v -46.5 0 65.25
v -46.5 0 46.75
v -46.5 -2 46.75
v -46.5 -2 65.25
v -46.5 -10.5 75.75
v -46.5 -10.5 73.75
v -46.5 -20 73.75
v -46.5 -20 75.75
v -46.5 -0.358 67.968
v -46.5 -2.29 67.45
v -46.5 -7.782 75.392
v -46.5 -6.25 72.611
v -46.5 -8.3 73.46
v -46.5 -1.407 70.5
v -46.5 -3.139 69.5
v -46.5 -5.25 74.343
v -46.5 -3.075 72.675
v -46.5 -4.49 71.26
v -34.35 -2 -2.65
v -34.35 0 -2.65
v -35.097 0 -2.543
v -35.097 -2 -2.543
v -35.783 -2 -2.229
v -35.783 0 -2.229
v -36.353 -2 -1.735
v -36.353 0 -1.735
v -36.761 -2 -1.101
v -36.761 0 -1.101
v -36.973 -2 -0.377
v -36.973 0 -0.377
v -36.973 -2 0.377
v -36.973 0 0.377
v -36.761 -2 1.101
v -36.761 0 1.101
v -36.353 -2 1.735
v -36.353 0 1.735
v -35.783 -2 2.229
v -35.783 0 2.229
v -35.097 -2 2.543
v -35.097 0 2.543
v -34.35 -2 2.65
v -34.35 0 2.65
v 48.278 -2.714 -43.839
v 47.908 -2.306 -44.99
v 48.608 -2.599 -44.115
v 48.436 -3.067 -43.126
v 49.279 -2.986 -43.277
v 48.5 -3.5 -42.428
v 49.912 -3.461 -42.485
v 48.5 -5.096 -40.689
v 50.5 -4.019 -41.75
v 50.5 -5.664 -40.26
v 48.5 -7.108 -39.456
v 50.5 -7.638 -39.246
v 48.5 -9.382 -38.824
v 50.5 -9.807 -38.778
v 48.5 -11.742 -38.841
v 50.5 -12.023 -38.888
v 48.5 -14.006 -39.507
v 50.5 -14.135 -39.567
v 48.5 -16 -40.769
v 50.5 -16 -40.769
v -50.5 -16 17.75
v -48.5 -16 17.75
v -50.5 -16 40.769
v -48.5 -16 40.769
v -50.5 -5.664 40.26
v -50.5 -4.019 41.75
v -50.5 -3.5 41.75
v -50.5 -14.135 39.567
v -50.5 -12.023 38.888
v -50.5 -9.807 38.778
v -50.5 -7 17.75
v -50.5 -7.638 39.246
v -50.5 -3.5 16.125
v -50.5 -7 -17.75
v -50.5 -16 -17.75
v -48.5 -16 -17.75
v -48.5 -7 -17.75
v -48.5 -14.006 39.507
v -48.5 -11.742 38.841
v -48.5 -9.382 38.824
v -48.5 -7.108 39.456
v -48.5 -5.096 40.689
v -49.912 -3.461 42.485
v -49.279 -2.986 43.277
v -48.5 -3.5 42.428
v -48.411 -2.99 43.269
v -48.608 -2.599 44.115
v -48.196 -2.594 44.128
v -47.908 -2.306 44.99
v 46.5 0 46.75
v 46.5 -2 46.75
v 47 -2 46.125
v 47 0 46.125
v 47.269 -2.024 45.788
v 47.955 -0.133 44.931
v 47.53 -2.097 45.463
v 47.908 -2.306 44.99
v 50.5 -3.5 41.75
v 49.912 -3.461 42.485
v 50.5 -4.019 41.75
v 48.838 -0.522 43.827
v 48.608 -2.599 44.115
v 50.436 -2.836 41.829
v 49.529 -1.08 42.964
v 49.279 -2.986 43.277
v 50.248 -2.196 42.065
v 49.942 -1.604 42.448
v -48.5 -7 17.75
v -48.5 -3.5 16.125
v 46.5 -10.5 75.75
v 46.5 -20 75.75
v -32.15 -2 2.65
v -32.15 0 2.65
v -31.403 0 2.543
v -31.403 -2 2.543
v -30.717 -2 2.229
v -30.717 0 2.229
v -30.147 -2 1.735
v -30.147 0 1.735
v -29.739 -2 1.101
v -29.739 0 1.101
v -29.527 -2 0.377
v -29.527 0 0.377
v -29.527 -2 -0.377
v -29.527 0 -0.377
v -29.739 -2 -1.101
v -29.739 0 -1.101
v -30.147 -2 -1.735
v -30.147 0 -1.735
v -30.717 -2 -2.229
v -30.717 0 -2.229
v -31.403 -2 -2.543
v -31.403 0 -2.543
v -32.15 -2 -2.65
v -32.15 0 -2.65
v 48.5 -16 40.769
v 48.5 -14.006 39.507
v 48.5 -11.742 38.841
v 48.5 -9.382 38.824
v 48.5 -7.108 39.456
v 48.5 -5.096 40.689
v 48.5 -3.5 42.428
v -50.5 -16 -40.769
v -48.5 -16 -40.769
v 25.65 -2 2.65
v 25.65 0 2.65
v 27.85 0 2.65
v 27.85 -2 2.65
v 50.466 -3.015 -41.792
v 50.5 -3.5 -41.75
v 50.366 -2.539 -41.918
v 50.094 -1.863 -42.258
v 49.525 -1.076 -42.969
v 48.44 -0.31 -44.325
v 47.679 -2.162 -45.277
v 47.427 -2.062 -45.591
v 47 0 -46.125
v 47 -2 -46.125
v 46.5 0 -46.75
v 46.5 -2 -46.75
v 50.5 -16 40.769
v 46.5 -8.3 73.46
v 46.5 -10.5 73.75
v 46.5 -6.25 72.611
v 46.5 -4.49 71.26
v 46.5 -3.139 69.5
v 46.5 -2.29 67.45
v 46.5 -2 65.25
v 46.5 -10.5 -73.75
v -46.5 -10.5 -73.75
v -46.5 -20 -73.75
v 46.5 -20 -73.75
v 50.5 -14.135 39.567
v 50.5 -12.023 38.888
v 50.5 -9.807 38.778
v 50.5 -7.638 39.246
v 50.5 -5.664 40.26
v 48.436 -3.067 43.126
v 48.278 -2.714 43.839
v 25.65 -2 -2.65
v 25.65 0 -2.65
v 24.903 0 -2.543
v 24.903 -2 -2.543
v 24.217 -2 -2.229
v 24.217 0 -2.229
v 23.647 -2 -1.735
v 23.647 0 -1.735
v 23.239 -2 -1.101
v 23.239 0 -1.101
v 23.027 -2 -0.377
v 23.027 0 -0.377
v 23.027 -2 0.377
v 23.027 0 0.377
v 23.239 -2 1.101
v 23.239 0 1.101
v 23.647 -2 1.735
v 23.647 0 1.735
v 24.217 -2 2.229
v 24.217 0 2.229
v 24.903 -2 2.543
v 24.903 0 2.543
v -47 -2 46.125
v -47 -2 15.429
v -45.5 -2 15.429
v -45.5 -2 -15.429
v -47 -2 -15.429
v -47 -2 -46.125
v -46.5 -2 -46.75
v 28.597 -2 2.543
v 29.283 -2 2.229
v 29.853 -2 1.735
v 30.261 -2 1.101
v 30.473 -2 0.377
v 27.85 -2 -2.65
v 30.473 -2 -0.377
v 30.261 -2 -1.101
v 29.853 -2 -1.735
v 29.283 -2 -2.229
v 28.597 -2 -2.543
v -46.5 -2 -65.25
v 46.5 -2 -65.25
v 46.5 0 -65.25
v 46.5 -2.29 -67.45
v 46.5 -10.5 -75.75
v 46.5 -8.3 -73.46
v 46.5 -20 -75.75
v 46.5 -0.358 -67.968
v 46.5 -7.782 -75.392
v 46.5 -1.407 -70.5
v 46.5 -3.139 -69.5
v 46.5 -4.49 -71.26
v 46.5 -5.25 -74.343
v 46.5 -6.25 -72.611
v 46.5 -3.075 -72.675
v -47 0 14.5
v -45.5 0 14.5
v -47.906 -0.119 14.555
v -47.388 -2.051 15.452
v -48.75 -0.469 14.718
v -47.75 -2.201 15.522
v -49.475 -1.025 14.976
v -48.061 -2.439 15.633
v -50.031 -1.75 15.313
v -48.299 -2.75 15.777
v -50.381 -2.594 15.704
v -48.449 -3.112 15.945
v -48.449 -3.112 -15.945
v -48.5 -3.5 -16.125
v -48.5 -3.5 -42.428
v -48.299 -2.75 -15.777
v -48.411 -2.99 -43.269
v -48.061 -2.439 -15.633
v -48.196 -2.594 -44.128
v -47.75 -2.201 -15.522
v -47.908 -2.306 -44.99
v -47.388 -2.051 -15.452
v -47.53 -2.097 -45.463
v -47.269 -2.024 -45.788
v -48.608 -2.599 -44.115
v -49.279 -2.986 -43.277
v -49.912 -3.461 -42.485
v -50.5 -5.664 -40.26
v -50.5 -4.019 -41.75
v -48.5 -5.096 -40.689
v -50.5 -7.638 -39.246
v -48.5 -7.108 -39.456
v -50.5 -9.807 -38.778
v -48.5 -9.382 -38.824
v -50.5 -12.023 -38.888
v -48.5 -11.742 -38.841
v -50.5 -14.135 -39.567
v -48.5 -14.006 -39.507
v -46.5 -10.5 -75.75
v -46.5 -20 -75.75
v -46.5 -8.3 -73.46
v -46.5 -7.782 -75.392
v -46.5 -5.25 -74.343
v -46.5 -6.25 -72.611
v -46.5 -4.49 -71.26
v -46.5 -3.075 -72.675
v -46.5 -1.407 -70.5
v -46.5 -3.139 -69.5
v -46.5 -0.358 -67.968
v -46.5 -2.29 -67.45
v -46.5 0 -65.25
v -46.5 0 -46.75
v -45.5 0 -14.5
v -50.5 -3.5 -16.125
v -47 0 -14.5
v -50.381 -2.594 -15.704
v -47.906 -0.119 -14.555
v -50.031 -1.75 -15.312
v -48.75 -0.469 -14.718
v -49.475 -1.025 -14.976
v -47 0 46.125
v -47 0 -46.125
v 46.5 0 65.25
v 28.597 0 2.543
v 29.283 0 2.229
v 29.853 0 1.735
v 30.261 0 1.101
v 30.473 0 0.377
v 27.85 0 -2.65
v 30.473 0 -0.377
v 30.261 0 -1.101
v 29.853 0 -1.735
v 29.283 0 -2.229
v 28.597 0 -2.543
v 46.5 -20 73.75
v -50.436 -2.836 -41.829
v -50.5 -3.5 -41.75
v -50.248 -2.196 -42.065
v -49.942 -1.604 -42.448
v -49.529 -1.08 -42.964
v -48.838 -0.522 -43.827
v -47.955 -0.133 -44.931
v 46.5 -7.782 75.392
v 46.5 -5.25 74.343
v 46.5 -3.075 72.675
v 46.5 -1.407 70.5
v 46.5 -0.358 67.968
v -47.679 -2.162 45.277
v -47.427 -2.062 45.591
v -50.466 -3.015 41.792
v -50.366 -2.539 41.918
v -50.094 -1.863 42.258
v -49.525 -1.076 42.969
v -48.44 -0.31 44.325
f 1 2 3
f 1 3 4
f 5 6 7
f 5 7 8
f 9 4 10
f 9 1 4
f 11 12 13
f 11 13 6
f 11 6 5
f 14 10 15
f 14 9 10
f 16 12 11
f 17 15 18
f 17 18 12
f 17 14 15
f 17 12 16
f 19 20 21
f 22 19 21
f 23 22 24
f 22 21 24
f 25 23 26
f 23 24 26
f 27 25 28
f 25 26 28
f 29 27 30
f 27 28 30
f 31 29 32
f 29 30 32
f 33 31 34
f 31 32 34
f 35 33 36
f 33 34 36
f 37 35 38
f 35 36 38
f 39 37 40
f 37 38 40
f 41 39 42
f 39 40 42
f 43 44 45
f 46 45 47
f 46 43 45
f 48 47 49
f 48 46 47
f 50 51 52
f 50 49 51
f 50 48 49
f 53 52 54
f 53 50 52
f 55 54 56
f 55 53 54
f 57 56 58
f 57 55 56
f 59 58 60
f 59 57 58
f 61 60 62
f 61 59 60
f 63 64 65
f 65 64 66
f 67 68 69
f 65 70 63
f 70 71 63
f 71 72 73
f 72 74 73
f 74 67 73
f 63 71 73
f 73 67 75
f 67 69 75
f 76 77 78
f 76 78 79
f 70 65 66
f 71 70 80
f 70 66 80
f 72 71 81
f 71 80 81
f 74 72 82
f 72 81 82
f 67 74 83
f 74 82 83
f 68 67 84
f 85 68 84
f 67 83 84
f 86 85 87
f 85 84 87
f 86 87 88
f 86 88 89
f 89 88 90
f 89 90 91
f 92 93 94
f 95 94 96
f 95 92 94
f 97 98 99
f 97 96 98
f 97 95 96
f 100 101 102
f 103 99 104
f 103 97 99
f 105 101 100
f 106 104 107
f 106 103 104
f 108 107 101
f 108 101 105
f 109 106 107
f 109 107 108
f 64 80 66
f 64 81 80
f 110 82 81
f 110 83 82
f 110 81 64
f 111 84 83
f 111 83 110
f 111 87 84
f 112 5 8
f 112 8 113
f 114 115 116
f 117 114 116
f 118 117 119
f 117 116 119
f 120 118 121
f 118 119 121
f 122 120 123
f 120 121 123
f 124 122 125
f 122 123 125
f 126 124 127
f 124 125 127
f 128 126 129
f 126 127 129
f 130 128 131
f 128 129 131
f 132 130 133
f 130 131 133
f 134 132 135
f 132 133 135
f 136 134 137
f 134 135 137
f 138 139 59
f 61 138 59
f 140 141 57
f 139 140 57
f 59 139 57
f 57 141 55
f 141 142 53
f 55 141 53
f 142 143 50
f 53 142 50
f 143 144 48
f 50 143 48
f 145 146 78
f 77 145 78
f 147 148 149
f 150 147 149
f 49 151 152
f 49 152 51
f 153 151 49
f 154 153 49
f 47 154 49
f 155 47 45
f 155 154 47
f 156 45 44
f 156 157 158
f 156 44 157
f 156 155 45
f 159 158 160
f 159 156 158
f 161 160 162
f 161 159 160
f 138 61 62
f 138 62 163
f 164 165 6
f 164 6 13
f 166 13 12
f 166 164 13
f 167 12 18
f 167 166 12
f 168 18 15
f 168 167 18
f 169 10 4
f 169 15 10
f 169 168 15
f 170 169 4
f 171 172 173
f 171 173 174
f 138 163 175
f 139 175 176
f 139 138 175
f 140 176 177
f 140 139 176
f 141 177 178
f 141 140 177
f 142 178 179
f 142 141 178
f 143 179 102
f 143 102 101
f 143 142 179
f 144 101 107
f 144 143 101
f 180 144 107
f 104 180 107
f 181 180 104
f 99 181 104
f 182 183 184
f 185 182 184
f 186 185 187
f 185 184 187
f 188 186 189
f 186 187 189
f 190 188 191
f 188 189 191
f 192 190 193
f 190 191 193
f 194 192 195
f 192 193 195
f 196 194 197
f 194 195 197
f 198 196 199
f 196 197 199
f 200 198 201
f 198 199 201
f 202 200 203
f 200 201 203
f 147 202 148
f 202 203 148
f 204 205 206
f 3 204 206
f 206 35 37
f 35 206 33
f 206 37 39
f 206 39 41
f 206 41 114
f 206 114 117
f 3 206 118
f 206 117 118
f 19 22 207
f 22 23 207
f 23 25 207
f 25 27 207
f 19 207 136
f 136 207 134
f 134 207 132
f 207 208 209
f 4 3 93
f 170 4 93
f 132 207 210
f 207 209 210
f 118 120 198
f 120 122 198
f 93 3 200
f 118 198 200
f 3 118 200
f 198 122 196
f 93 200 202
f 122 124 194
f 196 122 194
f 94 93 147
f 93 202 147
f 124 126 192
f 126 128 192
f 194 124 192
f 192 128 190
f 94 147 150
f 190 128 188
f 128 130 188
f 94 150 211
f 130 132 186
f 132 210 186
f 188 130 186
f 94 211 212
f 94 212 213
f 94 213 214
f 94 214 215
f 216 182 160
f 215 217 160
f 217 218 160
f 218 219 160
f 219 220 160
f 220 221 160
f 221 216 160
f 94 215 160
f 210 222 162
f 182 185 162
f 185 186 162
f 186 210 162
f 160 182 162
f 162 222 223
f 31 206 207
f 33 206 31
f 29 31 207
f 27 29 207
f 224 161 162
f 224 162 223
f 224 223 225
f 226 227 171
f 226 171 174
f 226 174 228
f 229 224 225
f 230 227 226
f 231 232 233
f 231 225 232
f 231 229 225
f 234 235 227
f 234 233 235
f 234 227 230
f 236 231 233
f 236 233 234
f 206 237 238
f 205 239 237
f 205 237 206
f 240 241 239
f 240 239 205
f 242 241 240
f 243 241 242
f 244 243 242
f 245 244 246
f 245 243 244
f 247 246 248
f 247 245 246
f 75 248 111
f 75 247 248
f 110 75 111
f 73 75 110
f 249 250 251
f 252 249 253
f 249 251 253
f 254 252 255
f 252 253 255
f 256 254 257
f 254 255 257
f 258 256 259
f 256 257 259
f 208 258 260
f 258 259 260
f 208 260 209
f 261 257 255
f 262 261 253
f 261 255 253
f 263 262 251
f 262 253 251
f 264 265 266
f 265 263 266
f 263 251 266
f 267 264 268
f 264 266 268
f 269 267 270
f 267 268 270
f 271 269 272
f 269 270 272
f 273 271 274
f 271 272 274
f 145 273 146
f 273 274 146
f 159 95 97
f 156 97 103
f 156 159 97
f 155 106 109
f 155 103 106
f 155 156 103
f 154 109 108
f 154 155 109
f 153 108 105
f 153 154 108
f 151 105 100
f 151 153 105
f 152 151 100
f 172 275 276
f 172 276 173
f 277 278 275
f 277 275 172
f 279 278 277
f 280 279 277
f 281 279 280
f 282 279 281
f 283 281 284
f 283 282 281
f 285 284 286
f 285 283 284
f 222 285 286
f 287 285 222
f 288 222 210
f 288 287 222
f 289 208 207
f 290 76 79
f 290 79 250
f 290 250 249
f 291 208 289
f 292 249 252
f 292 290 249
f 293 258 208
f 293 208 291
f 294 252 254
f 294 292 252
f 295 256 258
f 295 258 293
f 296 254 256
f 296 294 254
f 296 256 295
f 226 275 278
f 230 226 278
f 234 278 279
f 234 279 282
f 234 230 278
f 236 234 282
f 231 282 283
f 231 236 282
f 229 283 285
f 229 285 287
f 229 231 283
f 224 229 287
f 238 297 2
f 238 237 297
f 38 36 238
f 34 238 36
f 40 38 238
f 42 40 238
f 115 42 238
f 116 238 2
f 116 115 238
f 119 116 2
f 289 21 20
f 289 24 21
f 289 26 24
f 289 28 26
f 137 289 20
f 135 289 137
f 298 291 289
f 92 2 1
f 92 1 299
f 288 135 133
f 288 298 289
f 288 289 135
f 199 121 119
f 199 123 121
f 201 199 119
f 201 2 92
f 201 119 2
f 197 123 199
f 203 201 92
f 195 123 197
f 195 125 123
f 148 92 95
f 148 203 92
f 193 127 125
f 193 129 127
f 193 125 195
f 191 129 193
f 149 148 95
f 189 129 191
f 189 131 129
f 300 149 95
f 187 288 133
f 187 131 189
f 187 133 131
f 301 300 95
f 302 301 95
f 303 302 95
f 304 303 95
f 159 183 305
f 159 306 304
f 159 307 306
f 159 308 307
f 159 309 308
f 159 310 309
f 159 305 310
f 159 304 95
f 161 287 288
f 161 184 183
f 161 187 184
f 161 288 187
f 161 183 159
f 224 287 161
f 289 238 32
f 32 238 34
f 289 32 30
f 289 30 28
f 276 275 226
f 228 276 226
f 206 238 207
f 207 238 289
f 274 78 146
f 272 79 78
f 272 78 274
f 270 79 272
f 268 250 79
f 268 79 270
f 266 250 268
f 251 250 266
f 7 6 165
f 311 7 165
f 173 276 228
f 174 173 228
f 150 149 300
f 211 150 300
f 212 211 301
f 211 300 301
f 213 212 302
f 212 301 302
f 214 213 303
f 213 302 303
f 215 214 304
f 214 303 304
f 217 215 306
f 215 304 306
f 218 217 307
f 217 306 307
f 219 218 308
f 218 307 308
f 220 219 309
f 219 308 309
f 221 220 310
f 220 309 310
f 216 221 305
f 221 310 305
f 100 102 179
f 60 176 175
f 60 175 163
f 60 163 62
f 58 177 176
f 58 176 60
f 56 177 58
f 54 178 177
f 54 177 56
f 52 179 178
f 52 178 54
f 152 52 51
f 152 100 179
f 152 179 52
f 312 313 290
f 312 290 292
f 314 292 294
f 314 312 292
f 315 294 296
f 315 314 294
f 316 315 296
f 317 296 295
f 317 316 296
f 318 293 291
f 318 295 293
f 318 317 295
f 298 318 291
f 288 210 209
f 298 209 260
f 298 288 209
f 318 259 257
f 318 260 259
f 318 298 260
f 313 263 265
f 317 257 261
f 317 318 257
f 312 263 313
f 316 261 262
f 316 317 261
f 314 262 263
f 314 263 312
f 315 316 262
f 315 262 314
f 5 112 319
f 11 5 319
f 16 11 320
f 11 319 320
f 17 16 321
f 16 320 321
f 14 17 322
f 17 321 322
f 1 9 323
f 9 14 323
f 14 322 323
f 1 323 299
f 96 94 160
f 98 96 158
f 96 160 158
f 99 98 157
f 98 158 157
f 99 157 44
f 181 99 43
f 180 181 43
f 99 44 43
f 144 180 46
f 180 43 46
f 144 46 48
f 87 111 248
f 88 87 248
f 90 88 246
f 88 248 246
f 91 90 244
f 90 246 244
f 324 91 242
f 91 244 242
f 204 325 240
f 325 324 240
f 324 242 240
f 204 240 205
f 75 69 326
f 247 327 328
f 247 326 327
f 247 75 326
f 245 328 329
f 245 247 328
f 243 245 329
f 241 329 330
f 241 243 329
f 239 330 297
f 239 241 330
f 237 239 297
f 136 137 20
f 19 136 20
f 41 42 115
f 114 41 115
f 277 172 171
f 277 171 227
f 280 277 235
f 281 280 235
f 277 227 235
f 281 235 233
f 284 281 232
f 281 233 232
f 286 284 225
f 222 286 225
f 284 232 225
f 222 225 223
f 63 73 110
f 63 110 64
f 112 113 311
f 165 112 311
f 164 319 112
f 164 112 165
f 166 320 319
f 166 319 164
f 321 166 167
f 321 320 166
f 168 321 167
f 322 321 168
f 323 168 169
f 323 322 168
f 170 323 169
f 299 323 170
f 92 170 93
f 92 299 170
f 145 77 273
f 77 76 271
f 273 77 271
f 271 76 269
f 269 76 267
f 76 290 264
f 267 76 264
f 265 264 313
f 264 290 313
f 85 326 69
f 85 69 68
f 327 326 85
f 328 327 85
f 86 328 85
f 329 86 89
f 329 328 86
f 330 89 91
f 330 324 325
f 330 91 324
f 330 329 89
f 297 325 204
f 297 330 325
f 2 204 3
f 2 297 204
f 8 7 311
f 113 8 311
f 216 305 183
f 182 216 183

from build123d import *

# Parameters (mm, degrees)
ESQUISSE1_W                  = 101
ESQUISSE1_H                  = 151.5
EXTRUSION1_DEPTH             = 20
CONG_2_R                     = 10.5
CONG_3_R                     = 3.5
COQUE1_T                     = -2
ENL_V_MAT_EXTRU_4_DEPTH      = 21
ENL_V_MAT_EXTRU_1_DEPTH      = 51.5
ENL_V_MAT_EXTRU_1_DEPTH_BACK = 51.5
ENL_V_MAT_EXTRU_2_DEPTH      = 5
ENL_V_MAT_EXTRU_5_DEPTH      = 21


with BuildPart() as part:
    # Esquisse1 → Extrusion1 (new body)
    with BuildSketch(Plane(origin=(0, 0, 0), x_dir=(1, 0, 0), z_dir=(0, 1, 0))):
        Rectangle(ESQUISSE1_W, ESQUISSE1_H)
    extrude(amount=-EXTRUSION1_DEPTH)

    # Congé2
    cong_2_edges = [part.edges().sort_by_distance(p)[0] for p in [
        (0, 0, -75.75),
        (0, 0, 75.75),
    ]]
    fillet(cong_2_edges, radius=CONG_2_R)

    # Congé3
    cong_3_edges = [part.edges().sort_by_distance(p)[0] for p in [
        (-50.5, 0, 0),
        (50.5, 0, 0),
        (-50.5, -3.075378798, 72.674621202),
        (-50.5, -3.075378798, -72.674621202),
        (50.5, -3.075378798, 72.674621202),
        (50.5, -3.075378798, -72.674621202),
        (-50.5, -15.25, -75.75),
        (50.5, -15.25, -75.75),
        (50.5, -15.25, 75.75),
        (-50.5, -15.25, 75.75),
    ]]
    fillet(cong_3_edges, radius=CONG_3_R)

    # Coque1
    coque1_openings = [part.faces().sort_by_distance(p)[0] for p in [
        (0, -20, 0),
    ]]
    offset(amount=COQUE1_T, openings=coque1_openings, kind=Kind.INTERSECTION)

    # Esquisse5 → Enlèv. mat.-Extru.4 (cut, through all)
    with BuildSketch(Plane(origin=(0, 0, 0), x_dir=(-1, 0, 0), z_dir=(0, 1, 0))):
        Polygon((-46.5, -75.75), (-50.5, -75.75), (-50.5, -41.75), (-46.5, -46.75), align=None)
        Polygon((-46.5, 46.75), (-50.5, 41.75), (-50.5, 75.75), (-46.5, 75.75), align=None)
        Polygon((46.5, 75.75), (50.5, 75.75), (50.5, 41.75), (46.5, 46.75), align=None)
        Polygon((46.5, -46.75), (50.5, -41.75), (50.5, -75.75), (46.5, -75.75), align=None)
    extrude(amount=-ENL_V_MAT_EXTRU_4_DEPTH, mode=Mode.SUBTRACT)

    # Esquisse2 → Enlèv. mat.-Extru.1 (cut, two sides)
    with BuildSketch(Plane(origin=(0, 0, 0), x_dir=(0, 0, -1), z_dir=(1, 0, 0))) as enl_v_mat_extru_1_sk:
        with BuildLine():
            Line((-73.75, -10.5), (-73.75, -20))
            Line((-73.75, -20), (73.75, -20))
            Line((73.75, -20), (73.75, -10.5))
            ThreePointArc((73.75, -10.5), (71.26040764, -4.48959236), (65.25, -2))
            Line((65.25, -2), (47.25, -2))
            ThreePointArc((47.25, -2), (39.53637569, -6.929285786), (40.769259302, -16))
            Line((40.769259302, -16), (-40.769259302, -16))
            ThreePointArc((-40.769259302, -16), (-39.53637569, -6.929285786), (-47.25, -2))
            Line((-47.25, -2), (-65.25, -2))
            ThreePointArc((-65.25, -2), (-71.26040764, -4.48959236), (-73.75, -10.5))
        make_face()
    extrude(amount=ENL_V_MAT_EXTRU_1_DEPTH, mode=Mode.SUBTRACT)
    extrude(enl_v_mat_extru_1_sk.sketch, amount=-ENL_V_MAT_EXTRU_1_DEPTH_BACK, mode=Mode.SUBTRACT)

    # Esquisse3 → Enlèv. mat.-Extru.2 (cut)
    with BuildSketch(Plane.ZY.offset(50.5)):
        Polygon((-17.75, -16), (-17.75, -7), (-14.5, 0), (14.5, 0), (17.75, -7), (17.75, -16), align=None)
    extrude(amount=-ENL_V_MAT_EXTRU_2_DEPTH, mode=Mode.SUBTRACT)

    # Esquisse6 → Enlèv. mat.-Extru.5 (cut, through all)
    with BuildSketch(Plane(origin=(0, 0, 0), x_dir=(-1, 0, 0), z_dir=(0, 1, 0))):
        with BuildLine():
            Line((-25.65, 2.65), (-27.85, 2.65))
            ThreePointArc((-27.85, 2.65), (-30.5, 0), (-27.85, -2.65))
            Line((-27.85, -2.65), (-25.65, -2.65))
            ThreePointArc((-25.65, -2.65), (-23, 0), (-25.65, 2.65))
        make_face()
        with BuildLine():
            Line((32.15, -2.65), (34.35, -2.65))
            ThreePointArc((34.35, -2.65), (37, 0), (34.35, 2.65))
            Line((34.35, 2.65), (32.15, 2.65))
            ThreePointArc((32.15, 2.65), (29.5, 0), (32.15, -2.65))
        make_face()
    extrude(amount=-ENL_V_MAT_EXTRU_5_DEPTH, mode=Mode.SUBTRACT)


solid = part.part
